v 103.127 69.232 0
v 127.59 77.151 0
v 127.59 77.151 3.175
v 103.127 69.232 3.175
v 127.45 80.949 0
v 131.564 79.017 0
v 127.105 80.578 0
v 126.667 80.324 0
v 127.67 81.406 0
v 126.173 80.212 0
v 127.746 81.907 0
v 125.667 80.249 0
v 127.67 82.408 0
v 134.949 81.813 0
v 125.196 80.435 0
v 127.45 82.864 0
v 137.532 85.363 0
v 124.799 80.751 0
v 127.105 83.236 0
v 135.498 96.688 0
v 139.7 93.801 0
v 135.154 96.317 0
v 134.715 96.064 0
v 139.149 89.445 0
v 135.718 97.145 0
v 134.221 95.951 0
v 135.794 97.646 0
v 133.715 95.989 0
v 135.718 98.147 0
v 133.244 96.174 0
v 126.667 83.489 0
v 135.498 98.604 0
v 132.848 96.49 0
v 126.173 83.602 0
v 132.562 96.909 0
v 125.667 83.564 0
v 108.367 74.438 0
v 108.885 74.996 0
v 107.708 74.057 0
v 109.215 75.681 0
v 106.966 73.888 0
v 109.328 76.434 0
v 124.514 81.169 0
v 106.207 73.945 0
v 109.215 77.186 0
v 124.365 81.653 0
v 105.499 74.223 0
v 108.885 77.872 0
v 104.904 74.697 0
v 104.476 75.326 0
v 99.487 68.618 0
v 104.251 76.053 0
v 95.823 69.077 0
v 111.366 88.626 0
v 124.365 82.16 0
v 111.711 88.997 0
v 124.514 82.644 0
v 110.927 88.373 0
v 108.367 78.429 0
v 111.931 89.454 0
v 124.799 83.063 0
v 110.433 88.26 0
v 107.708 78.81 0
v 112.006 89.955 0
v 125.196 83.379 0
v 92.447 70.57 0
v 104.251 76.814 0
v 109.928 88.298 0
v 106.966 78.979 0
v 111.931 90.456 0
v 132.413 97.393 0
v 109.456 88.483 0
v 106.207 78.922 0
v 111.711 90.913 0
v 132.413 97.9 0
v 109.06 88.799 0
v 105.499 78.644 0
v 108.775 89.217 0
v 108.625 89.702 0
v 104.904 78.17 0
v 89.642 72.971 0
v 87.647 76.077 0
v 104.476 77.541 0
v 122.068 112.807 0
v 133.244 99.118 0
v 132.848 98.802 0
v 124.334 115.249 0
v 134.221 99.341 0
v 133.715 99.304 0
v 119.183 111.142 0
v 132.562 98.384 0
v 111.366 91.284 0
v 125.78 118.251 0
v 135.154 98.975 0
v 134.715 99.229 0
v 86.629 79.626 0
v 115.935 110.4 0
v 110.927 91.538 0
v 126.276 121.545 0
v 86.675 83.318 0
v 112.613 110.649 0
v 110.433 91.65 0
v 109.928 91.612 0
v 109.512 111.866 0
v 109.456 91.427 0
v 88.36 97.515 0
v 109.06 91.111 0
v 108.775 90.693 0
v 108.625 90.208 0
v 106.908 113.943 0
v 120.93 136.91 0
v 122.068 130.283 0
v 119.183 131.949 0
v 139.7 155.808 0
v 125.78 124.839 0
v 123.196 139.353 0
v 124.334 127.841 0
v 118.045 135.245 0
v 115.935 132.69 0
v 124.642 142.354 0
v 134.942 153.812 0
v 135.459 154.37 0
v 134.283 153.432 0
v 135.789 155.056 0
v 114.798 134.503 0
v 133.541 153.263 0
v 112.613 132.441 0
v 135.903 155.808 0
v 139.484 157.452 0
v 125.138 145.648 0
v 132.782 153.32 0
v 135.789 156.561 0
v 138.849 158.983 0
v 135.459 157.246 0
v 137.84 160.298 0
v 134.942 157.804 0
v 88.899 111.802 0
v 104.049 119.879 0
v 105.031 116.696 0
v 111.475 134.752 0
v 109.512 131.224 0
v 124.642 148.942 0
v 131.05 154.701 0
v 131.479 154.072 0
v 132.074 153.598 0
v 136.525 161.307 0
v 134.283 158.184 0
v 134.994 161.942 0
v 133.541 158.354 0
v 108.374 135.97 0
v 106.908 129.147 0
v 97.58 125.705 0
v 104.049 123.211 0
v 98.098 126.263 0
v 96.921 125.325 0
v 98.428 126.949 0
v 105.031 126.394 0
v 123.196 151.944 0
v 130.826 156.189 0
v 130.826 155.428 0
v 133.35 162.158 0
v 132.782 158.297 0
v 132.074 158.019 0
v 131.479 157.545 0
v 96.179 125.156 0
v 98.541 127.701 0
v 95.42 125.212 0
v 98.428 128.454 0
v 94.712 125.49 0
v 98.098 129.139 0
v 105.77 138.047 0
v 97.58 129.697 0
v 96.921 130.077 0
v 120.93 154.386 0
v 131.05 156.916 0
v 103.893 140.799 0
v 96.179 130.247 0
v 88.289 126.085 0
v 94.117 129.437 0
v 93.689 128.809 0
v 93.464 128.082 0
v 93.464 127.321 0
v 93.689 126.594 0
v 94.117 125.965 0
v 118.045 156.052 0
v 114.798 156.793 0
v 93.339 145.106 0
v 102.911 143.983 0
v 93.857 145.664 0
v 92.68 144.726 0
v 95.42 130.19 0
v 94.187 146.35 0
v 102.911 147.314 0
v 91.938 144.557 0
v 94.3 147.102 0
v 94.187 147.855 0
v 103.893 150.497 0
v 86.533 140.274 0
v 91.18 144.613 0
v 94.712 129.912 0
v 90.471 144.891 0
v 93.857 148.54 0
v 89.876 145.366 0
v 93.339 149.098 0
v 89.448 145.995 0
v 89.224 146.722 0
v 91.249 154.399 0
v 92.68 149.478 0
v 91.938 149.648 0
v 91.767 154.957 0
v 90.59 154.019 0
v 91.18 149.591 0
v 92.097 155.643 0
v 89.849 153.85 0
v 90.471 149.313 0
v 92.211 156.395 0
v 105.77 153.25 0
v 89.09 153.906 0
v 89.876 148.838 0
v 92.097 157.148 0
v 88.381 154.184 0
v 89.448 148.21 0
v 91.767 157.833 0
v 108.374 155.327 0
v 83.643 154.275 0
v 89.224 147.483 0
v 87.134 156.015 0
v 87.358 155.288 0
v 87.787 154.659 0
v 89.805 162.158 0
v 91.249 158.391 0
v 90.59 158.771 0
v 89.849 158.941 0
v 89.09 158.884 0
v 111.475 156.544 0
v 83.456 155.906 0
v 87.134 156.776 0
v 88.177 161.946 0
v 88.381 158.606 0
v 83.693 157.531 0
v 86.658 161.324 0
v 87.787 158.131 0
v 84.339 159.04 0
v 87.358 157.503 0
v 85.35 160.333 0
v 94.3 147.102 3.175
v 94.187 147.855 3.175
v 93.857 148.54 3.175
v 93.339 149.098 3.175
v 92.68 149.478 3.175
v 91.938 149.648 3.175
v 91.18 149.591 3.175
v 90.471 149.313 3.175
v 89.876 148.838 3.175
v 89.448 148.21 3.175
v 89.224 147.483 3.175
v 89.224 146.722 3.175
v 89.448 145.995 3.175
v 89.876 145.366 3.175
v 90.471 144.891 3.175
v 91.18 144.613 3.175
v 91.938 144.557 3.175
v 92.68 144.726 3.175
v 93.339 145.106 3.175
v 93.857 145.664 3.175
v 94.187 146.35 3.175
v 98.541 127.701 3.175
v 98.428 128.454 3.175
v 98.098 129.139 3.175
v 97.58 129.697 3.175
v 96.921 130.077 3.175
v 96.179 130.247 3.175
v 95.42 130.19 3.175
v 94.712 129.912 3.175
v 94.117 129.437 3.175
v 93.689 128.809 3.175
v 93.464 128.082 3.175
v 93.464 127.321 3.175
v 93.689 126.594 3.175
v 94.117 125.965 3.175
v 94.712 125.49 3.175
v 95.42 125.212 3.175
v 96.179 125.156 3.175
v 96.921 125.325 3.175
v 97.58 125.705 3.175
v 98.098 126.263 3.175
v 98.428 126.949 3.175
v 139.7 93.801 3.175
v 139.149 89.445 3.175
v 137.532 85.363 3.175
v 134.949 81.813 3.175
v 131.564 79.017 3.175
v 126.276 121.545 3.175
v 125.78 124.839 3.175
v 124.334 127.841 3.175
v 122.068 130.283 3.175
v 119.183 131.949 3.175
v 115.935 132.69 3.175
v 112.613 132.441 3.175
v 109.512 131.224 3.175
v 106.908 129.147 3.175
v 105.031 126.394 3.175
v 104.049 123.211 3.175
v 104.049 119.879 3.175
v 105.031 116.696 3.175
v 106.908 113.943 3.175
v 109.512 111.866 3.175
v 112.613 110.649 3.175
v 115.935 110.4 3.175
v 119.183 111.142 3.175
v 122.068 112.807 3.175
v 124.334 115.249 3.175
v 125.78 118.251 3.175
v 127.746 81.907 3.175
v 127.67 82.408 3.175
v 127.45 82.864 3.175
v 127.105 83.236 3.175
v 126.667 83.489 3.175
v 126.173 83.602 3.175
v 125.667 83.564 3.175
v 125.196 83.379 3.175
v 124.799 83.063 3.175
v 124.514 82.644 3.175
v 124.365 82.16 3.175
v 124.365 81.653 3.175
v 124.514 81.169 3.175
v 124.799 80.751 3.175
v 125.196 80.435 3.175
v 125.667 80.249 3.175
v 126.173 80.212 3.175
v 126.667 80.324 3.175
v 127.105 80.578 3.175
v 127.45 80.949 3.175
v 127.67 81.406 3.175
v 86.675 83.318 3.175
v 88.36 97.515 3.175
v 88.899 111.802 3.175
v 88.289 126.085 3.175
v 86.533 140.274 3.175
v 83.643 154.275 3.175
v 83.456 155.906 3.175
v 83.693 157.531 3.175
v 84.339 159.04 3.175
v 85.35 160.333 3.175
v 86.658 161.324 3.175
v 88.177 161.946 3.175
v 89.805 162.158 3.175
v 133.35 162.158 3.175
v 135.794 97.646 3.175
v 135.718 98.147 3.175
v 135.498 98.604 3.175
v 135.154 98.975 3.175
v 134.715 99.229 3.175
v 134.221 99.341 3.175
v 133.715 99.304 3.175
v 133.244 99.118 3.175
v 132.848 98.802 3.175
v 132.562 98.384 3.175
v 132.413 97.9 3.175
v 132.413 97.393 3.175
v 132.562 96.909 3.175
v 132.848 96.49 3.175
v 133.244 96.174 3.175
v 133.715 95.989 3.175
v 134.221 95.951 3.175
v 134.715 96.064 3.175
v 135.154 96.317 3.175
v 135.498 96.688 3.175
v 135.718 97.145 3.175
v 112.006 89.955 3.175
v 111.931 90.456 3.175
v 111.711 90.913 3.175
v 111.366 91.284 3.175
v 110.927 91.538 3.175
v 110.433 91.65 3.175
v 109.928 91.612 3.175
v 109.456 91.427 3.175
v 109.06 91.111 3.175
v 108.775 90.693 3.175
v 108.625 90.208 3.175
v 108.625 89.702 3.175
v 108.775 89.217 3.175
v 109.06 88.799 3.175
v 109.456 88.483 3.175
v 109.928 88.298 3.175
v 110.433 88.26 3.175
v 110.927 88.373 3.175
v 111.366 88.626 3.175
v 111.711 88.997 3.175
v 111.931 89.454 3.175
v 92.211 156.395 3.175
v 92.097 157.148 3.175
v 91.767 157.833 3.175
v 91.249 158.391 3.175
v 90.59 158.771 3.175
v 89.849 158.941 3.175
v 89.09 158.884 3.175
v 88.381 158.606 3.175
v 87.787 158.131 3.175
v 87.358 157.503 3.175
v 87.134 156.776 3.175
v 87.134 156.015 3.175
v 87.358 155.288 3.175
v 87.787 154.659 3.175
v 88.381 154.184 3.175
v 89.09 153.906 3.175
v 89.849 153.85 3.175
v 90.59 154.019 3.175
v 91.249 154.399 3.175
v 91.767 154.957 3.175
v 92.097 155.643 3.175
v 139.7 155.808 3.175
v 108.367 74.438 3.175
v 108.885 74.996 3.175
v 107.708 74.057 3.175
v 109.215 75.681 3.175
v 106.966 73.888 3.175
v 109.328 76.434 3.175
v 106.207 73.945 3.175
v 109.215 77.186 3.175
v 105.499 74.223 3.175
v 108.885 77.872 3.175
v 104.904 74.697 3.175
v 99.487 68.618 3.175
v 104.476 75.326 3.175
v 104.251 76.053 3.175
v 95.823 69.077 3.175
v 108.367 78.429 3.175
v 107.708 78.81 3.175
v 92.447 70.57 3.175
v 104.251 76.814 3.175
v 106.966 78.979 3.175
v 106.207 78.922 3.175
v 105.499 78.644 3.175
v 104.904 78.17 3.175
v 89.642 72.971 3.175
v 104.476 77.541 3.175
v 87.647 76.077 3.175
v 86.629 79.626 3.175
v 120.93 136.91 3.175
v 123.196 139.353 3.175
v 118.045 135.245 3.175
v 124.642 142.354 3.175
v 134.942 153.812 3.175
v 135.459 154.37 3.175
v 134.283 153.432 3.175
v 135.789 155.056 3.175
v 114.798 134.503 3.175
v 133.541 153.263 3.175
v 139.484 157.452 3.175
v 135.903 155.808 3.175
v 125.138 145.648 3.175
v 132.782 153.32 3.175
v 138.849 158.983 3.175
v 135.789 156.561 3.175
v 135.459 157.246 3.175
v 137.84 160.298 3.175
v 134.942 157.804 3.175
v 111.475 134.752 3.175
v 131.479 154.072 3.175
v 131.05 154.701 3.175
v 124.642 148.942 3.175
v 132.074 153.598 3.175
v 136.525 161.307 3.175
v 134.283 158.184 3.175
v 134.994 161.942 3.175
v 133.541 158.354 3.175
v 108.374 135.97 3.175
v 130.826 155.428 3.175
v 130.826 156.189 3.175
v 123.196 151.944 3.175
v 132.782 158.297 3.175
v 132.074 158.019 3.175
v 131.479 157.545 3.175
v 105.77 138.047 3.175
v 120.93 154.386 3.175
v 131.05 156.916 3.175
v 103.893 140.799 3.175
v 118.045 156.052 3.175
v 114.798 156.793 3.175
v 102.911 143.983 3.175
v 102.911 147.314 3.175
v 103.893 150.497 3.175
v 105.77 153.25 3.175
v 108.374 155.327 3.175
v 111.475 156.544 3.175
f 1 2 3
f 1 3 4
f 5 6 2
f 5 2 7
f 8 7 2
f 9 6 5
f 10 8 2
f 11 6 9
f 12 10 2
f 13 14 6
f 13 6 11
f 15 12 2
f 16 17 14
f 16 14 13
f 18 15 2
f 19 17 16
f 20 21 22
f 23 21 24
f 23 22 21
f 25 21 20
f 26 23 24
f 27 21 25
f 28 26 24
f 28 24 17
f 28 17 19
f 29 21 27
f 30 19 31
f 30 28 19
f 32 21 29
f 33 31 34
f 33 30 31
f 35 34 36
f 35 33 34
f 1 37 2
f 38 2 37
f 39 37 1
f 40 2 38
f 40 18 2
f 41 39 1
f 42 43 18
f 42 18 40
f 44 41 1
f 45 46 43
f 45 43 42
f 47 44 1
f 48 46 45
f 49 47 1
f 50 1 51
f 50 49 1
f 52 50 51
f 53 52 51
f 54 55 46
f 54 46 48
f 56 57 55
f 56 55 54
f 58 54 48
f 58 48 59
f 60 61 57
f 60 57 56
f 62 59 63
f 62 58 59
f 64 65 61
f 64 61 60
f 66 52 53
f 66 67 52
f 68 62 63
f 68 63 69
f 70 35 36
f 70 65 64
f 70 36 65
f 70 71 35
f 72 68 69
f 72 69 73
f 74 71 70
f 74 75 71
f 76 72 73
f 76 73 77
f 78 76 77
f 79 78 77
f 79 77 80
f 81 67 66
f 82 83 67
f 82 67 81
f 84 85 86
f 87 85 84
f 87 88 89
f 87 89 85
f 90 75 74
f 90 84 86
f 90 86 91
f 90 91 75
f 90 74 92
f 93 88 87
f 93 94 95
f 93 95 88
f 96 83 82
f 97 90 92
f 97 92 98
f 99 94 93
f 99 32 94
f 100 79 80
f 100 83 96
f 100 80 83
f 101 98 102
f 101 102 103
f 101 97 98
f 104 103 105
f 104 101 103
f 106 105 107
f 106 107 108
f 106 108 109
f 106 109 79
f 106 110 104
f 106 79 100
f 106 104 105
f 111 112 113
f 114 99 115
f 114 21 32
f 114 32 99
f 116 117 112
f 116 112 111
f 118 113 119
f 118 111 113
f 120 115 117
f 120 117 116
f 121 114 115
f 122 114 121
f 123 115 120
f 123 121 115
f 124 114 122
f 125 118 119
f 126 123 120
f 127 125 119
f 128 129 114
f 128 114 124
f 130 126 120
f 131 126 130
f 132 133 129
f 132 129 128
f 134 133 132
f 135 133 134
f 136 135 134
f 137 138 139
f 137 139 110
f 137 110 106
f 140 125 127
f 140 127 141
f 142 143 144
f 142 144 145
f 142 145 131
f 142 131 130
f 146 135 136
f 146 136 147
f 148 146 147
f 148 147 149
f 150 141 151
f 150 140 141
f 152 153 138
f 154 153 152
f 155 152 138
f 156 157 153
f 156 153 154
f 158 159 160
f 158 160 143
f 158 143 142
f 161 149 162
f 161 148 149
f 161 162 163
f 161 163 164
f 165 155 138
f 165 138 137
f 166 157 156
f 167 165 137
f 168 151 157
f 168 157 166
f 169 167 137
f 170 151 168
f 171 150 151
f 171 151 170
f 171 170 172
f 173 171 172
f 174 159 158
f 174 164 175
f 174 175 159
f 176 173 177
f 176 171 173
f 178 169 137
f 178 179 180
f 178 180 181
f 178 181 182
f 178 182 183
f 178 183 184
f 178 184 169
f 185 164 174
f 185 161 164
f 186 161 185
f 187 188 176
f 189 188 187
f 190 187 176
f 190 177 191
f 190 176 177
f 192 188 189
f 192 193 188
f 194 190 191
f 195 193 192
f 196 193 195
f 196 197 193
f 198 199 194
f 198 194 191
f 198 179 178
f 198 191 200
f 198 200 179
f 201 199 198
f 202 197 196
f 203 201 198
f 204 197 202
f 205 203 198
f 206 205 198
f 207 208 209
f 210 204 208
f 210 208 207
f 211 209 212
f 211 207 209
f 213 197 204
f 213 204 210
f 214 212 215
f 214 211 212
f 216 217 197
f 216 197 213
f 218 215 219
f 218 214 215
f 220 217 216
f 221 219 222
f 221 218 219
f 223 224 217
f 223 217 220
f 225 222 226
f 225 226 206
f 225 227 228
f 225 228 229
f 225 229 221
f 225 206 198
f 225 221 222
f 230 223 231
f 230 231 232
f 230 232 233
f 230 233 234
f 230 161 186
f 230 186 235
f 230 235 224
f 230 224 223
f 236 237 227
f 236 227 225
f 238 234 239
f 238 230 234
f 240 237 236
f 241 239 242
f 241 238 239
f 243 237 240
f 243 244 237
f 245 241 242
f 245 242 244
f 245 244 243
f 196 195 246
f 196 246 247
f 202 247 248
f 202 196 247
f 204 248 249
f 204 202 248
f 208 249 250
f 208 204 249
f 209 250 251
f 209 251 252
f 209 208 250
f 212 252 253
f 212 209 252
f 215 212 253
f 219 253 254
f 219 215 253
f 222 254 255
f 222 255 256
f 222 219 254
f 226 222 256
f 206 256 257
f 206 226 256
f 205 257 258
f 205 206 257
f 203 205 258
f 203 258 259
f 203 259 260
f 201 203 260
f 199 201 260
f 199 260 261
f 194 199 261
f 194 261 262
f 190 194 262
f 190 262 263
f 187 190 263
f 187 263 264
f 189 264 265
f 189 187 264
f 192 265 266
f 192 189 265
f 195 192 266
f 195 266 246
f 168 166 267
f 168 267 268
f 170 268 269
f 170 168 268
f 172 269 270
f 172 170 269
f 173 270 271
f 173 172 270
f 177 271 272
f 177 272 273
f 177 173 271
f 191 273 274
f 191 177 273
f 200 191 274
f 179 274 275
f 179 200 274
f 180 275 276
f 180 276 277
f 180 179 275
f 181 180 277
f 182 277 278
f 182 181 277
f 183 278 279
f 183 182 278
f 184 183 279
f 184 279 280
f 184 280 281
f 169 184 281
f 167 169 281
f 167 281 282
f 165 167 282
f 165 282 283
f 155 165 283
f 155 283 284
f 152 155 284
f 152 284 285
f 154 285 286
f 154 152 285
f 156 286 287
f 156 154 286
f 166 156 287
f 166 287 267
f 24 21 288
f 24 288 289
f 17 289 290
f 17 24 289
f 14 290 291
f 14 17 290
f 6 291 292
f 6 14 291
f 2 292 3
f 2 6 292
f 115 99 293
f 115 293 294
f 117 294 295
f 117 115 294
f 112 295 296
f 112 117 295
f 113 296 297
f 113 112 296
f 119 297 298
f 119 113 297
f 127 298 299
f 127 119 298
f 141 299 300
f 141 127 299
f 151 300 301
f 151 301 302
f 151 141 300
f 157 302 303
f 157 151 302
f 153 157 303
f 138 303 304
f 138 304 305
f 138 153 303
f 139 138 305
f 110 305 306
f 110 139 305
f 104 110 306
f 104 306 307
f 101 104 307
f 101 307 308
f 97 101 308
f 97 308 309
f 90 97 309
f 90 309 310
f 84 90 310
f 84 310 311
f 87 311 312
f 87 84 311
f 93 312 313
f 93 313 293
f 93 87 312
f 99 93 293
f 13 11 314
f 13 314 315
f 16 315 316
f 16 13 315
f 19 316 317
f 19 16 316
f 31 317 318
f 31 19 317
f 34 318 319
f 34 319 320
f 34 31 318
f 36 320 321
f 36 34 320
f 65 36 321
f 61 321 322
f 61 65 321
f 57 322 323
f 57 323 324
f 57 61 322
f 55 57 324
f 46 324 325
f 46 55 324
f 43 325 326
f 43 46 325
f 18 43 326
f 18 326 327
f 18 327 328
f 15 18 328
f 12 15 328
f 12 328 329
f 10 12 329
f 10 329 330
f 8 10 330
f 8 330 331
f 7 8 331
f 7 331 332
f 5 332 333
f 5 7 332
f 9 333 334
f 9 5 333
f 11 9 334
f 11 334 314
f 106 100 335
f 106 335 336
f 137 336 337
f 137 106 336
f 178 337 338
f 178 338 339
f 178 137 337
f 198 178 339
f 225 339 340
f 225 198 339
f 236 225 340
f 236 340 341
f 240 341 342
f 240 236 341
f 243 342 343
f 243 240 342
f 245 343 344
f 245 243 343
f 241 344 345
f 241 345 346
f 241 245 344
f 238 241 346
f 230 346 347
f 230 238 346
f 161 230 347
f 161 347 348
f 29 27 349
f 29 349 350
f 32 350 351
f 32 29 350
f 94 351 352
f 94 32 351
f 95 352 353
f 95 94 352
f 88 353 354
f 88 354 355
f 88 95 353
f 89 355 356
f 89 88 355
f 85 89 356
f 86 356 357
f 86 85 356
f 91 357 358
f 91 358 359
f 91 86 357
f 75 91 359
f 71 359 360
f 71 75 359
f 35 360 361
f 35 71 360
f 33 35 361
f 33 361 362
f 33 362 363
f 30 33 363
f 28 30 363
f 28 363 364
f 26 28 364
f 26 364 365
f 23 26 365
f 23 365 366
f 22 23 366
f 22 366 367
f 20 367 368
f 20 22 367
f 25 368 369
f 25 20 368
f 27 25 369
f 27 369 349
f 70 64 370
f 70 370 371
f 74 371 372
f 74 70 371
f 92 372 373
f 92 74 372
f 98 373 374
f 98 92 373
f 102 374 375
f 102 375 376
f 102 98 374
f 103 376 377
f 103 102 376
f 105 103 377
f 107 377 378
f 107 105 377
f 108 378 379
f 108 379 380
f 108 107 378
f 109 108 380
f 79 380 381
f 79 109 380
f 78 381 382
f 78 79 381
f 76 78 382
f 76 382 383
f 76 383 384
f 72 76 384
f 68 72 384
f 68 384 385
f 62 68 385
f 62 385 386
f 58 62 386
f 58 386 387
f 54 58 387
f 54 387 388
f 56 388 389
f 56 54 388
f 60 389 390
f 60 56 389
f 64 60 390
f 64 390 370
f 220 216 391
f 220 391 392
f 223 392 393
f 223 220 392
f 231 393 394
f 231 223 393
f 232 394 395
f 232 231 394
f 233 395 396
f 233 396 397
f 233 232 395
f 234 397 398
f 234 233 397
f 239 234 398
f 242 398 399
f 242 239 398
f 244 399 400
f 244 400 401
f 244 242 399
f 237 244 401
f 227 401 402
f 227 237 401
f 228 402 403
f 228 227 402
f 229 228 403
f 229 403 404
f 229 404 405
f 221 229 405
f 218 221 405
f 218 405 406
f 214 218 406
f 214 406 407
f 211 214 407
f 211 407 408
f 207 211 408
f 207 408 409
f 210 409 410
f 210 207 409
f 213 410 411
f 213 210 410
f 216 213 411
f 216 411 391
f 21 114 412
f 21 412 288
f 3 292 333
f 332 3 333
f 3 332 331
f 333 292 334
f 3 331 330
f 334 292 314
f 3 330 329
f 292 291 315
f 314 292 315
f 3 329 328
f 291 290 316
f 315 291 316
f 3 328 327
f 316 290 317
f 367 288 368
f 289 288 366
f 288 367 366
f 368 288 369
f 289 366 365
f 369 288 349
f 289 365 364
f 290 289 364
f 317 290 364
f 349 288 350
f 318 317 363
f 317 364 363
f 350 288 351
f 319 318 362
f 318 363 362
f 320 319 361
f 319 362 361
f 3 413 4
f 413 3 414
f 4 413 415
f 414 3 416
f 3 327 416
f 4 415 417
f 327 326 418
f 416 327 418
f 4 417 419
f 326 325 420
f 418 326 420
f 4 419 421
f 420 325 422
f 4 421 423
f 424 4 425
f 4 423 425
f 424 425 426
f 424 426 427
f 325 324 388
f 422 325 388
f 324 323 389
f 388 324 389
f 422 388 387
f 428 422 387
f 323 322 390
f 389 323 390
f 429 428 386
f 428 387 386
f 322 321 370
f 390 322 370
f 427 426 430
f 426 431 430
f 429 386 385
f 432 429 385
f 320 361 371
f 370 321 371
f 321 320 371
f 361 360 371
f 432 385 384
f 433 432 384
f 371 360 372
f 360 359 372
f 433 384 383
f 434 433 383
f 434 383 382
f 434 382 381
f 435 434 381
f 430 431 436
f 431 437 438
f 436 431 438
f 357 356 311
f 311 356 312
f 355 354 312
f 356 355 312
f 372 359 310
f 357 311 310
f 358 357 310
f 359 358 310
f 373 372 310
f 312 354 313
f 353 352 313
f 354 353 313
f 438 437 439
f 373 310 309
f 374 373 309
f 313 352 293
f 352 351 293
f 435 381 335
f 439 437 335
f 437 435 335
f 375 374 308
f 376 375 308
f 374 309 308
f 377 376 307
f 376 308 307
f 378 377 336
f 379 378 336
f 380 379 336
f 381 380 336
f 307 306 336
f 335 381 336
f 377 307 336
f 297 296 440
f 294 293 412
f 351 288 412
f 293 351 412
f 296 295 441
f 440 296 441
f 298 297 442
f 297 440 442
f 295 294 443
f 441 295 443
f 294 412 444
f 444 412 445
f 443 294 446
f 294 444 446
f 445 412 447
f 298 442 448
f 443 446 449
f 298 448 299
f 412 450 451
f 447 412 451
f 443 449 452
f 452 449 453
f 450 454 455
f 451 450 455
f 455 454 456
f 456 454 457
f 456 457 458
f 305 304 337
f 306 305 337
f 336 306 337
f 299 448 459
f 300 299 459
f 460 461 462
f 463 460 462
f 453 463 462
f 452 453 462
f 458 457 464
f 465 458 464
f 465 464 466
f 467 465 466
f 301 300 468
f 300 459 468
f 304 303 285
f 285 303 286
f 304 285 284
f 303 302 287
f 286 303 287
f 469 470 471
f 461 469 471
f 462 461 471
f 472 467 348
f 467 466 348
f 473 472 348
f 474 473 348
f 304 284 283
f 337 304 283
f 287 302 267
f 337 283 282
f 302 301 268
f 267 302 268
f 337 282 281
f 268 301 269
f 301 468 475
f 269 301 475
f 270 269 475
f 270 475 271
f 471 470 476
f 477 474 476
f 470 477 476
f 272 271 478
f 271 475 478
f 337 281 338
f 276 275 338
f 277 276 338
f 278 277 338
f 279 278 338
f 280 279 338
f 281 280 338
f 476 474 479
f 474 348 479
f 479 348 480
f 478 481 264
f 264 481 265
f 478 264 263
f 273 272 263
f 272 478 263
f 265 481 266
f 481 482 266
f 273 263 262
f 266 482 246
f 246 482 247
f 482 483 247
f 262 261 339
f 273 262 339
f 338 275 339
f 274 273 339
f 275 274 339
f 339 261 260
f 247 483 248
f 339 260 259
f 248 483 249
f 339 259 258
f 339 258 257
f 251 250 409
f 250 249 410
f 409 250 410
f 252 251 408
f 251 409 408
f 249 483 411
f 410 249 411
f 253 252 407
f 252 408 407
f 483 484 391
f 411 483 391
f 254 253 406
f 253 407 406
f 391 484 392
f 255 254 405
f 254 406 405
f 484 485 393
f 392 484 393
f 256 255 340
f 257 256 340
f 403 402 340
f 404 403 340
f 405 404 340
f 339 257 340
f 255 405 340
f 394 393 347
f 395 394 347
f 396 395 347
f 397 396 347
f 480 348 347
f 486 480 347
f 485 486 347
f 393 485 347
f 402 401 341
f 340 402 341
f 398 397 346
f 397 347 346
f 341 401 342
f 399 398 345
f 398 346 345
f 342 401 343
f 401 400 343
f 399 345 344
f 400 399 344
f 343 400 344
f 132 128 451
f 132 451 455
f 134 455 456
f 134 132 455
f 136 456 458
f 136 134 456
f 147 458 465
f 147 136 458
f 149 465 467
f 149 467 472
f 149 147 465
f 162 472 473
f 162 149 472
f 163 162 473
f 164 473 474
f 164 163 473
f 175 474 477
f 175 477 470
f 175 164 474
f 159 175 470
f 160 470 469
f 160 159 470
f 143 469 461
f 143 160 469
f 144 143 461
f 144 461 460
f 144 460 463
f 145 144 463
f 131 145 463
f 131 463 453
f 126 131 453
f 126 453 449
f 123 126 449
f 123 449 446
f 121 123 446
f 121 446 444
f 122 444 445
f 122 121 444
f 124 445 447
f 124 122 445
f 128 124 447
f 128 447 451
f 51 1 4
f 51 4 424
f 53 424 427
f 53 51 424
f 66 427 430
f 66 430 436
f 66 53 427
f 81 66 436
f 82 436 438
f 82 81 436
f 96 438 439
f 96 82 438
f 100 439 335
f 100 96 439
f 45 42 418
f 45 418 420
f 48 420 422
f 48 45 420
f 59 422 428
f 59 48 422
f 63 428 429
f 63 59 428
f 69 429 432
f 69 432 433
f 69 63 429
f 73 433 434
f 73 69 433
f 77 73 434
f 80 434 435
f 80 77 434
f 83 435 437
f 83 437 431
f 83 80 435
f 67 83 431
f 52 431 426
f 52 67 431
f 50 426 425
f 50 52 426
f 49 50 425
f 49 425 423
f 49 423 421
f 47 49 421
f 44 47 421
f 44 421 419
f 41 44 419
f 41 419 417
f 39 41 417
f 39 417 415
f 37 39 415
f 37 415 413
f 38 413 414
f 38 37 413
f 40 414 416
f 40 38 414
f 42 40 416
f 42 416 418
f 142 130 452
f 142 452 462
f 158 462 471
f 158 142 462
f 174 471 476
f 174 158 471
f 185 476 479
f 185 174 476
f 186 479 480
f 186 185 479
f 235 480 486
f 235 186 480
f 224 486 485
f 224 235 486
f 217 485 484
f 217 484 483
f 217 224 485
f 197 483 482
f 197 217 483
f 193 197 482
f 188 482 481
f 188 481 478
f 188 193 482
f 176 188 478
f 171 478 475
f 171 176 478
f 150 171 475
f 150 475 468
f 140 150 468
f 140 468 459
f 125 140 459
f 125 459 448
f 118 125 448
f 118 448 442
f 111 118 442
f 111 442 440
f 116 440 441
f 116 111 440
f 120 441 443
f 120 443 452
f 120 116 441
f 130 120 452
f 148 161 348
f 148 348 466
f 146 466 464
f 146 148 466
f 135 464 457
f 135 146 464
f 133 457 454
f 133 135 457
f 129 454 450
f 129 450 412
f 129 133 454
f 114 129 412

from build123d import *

# Parameters (mm, degrees)
SKETCH2_R           = 2.5527
SKETCH2_R_2         = 11.176
SKETCH2_R_3         = 1.7
BOSS_EXTRUDE1_DEPTH = 3.175


with BuildPart() as part:
    # Sketch2 → Boss-Extrude1 (new body)
    with BuildSketch(Plane.XY):
        with BuildLine():
            Line((89.804840449, 162.158224077), (133.35, 162.158224077))
            ThreePointArc((133.35, 162.158224077), (137.840128061, 160.298352138), (139.7, 155.808224077))
            Line((139.7, 155.808224077), (139.7, 93.800599977))
            ThreePointArc((139.7, 93.800599977), (136.352183067, 83.506635024), (127.589632634, 77.151219806))
            Line((127.589632634, 77.151219806), (103.12742621, 69.232468195))
            ThreePointArc((103.12742621, 69.232468195), (90.956620775, 71.66782369), (86.675019958, 83.318032089))
            ThreePointArc((86.675019958, 83.318032089), (88.737860448, 118.949701892), (83.642604572, 154.275465457))
            ThreePointArc((83.642604572, 154.275465457), (84.802065357, 159.719073266), (89.804840449, 162.158224077))
        make_face()
        with Locations((89.657841737, 156.395094021)):
            Circle(SKETCH2_R, mode=Mode.SUBTRACT)
        with Locations((91.747700228, 147.102187237)):
            Circle(SKETCH2_R, mode=Mode.SUBTRACT)
        with Locations((106.775437357, 76.433708644)):
            Circle(SKETCH2_R, mode=Mode.SUBTRACT)
        with Locations((115.1001, 121.545060726)):
            Circle(SKETCH2_R_2, mode=Mode.SUBTRACT)
        with Locations((113.962375762, 145.648224077)):
            Circle(SKETCH2_R_2, mode=Mode.SUBTRACT)
        with Locations((133.35, 155.808224077)):
            Circle(SKETCH2_R, mode=Mode.SUBTRACT)
        with Locations((95.988414932, 127.701170501)):
            Circle(SKETCH2_R, mode=Mode.SUBTRACT)
        with Locations((134.09377421, 97.646134406)):
            Circle(SKETCH2_R_3, mode=Mode.SUBTRACT)
        with Locations((126.045534429, 81.906825767)):
            Circle(SKETCH2_R_3, mode=Mode.SUBTRACT)
        with Locations((110.30622579, 89.955065547)):
            Circle(SKETCH2_R_3, mode=Mode.SUBTRACT)
    extrude(amount=BOSS_EXTRUDE1_DEPTH)


solid = part.part
